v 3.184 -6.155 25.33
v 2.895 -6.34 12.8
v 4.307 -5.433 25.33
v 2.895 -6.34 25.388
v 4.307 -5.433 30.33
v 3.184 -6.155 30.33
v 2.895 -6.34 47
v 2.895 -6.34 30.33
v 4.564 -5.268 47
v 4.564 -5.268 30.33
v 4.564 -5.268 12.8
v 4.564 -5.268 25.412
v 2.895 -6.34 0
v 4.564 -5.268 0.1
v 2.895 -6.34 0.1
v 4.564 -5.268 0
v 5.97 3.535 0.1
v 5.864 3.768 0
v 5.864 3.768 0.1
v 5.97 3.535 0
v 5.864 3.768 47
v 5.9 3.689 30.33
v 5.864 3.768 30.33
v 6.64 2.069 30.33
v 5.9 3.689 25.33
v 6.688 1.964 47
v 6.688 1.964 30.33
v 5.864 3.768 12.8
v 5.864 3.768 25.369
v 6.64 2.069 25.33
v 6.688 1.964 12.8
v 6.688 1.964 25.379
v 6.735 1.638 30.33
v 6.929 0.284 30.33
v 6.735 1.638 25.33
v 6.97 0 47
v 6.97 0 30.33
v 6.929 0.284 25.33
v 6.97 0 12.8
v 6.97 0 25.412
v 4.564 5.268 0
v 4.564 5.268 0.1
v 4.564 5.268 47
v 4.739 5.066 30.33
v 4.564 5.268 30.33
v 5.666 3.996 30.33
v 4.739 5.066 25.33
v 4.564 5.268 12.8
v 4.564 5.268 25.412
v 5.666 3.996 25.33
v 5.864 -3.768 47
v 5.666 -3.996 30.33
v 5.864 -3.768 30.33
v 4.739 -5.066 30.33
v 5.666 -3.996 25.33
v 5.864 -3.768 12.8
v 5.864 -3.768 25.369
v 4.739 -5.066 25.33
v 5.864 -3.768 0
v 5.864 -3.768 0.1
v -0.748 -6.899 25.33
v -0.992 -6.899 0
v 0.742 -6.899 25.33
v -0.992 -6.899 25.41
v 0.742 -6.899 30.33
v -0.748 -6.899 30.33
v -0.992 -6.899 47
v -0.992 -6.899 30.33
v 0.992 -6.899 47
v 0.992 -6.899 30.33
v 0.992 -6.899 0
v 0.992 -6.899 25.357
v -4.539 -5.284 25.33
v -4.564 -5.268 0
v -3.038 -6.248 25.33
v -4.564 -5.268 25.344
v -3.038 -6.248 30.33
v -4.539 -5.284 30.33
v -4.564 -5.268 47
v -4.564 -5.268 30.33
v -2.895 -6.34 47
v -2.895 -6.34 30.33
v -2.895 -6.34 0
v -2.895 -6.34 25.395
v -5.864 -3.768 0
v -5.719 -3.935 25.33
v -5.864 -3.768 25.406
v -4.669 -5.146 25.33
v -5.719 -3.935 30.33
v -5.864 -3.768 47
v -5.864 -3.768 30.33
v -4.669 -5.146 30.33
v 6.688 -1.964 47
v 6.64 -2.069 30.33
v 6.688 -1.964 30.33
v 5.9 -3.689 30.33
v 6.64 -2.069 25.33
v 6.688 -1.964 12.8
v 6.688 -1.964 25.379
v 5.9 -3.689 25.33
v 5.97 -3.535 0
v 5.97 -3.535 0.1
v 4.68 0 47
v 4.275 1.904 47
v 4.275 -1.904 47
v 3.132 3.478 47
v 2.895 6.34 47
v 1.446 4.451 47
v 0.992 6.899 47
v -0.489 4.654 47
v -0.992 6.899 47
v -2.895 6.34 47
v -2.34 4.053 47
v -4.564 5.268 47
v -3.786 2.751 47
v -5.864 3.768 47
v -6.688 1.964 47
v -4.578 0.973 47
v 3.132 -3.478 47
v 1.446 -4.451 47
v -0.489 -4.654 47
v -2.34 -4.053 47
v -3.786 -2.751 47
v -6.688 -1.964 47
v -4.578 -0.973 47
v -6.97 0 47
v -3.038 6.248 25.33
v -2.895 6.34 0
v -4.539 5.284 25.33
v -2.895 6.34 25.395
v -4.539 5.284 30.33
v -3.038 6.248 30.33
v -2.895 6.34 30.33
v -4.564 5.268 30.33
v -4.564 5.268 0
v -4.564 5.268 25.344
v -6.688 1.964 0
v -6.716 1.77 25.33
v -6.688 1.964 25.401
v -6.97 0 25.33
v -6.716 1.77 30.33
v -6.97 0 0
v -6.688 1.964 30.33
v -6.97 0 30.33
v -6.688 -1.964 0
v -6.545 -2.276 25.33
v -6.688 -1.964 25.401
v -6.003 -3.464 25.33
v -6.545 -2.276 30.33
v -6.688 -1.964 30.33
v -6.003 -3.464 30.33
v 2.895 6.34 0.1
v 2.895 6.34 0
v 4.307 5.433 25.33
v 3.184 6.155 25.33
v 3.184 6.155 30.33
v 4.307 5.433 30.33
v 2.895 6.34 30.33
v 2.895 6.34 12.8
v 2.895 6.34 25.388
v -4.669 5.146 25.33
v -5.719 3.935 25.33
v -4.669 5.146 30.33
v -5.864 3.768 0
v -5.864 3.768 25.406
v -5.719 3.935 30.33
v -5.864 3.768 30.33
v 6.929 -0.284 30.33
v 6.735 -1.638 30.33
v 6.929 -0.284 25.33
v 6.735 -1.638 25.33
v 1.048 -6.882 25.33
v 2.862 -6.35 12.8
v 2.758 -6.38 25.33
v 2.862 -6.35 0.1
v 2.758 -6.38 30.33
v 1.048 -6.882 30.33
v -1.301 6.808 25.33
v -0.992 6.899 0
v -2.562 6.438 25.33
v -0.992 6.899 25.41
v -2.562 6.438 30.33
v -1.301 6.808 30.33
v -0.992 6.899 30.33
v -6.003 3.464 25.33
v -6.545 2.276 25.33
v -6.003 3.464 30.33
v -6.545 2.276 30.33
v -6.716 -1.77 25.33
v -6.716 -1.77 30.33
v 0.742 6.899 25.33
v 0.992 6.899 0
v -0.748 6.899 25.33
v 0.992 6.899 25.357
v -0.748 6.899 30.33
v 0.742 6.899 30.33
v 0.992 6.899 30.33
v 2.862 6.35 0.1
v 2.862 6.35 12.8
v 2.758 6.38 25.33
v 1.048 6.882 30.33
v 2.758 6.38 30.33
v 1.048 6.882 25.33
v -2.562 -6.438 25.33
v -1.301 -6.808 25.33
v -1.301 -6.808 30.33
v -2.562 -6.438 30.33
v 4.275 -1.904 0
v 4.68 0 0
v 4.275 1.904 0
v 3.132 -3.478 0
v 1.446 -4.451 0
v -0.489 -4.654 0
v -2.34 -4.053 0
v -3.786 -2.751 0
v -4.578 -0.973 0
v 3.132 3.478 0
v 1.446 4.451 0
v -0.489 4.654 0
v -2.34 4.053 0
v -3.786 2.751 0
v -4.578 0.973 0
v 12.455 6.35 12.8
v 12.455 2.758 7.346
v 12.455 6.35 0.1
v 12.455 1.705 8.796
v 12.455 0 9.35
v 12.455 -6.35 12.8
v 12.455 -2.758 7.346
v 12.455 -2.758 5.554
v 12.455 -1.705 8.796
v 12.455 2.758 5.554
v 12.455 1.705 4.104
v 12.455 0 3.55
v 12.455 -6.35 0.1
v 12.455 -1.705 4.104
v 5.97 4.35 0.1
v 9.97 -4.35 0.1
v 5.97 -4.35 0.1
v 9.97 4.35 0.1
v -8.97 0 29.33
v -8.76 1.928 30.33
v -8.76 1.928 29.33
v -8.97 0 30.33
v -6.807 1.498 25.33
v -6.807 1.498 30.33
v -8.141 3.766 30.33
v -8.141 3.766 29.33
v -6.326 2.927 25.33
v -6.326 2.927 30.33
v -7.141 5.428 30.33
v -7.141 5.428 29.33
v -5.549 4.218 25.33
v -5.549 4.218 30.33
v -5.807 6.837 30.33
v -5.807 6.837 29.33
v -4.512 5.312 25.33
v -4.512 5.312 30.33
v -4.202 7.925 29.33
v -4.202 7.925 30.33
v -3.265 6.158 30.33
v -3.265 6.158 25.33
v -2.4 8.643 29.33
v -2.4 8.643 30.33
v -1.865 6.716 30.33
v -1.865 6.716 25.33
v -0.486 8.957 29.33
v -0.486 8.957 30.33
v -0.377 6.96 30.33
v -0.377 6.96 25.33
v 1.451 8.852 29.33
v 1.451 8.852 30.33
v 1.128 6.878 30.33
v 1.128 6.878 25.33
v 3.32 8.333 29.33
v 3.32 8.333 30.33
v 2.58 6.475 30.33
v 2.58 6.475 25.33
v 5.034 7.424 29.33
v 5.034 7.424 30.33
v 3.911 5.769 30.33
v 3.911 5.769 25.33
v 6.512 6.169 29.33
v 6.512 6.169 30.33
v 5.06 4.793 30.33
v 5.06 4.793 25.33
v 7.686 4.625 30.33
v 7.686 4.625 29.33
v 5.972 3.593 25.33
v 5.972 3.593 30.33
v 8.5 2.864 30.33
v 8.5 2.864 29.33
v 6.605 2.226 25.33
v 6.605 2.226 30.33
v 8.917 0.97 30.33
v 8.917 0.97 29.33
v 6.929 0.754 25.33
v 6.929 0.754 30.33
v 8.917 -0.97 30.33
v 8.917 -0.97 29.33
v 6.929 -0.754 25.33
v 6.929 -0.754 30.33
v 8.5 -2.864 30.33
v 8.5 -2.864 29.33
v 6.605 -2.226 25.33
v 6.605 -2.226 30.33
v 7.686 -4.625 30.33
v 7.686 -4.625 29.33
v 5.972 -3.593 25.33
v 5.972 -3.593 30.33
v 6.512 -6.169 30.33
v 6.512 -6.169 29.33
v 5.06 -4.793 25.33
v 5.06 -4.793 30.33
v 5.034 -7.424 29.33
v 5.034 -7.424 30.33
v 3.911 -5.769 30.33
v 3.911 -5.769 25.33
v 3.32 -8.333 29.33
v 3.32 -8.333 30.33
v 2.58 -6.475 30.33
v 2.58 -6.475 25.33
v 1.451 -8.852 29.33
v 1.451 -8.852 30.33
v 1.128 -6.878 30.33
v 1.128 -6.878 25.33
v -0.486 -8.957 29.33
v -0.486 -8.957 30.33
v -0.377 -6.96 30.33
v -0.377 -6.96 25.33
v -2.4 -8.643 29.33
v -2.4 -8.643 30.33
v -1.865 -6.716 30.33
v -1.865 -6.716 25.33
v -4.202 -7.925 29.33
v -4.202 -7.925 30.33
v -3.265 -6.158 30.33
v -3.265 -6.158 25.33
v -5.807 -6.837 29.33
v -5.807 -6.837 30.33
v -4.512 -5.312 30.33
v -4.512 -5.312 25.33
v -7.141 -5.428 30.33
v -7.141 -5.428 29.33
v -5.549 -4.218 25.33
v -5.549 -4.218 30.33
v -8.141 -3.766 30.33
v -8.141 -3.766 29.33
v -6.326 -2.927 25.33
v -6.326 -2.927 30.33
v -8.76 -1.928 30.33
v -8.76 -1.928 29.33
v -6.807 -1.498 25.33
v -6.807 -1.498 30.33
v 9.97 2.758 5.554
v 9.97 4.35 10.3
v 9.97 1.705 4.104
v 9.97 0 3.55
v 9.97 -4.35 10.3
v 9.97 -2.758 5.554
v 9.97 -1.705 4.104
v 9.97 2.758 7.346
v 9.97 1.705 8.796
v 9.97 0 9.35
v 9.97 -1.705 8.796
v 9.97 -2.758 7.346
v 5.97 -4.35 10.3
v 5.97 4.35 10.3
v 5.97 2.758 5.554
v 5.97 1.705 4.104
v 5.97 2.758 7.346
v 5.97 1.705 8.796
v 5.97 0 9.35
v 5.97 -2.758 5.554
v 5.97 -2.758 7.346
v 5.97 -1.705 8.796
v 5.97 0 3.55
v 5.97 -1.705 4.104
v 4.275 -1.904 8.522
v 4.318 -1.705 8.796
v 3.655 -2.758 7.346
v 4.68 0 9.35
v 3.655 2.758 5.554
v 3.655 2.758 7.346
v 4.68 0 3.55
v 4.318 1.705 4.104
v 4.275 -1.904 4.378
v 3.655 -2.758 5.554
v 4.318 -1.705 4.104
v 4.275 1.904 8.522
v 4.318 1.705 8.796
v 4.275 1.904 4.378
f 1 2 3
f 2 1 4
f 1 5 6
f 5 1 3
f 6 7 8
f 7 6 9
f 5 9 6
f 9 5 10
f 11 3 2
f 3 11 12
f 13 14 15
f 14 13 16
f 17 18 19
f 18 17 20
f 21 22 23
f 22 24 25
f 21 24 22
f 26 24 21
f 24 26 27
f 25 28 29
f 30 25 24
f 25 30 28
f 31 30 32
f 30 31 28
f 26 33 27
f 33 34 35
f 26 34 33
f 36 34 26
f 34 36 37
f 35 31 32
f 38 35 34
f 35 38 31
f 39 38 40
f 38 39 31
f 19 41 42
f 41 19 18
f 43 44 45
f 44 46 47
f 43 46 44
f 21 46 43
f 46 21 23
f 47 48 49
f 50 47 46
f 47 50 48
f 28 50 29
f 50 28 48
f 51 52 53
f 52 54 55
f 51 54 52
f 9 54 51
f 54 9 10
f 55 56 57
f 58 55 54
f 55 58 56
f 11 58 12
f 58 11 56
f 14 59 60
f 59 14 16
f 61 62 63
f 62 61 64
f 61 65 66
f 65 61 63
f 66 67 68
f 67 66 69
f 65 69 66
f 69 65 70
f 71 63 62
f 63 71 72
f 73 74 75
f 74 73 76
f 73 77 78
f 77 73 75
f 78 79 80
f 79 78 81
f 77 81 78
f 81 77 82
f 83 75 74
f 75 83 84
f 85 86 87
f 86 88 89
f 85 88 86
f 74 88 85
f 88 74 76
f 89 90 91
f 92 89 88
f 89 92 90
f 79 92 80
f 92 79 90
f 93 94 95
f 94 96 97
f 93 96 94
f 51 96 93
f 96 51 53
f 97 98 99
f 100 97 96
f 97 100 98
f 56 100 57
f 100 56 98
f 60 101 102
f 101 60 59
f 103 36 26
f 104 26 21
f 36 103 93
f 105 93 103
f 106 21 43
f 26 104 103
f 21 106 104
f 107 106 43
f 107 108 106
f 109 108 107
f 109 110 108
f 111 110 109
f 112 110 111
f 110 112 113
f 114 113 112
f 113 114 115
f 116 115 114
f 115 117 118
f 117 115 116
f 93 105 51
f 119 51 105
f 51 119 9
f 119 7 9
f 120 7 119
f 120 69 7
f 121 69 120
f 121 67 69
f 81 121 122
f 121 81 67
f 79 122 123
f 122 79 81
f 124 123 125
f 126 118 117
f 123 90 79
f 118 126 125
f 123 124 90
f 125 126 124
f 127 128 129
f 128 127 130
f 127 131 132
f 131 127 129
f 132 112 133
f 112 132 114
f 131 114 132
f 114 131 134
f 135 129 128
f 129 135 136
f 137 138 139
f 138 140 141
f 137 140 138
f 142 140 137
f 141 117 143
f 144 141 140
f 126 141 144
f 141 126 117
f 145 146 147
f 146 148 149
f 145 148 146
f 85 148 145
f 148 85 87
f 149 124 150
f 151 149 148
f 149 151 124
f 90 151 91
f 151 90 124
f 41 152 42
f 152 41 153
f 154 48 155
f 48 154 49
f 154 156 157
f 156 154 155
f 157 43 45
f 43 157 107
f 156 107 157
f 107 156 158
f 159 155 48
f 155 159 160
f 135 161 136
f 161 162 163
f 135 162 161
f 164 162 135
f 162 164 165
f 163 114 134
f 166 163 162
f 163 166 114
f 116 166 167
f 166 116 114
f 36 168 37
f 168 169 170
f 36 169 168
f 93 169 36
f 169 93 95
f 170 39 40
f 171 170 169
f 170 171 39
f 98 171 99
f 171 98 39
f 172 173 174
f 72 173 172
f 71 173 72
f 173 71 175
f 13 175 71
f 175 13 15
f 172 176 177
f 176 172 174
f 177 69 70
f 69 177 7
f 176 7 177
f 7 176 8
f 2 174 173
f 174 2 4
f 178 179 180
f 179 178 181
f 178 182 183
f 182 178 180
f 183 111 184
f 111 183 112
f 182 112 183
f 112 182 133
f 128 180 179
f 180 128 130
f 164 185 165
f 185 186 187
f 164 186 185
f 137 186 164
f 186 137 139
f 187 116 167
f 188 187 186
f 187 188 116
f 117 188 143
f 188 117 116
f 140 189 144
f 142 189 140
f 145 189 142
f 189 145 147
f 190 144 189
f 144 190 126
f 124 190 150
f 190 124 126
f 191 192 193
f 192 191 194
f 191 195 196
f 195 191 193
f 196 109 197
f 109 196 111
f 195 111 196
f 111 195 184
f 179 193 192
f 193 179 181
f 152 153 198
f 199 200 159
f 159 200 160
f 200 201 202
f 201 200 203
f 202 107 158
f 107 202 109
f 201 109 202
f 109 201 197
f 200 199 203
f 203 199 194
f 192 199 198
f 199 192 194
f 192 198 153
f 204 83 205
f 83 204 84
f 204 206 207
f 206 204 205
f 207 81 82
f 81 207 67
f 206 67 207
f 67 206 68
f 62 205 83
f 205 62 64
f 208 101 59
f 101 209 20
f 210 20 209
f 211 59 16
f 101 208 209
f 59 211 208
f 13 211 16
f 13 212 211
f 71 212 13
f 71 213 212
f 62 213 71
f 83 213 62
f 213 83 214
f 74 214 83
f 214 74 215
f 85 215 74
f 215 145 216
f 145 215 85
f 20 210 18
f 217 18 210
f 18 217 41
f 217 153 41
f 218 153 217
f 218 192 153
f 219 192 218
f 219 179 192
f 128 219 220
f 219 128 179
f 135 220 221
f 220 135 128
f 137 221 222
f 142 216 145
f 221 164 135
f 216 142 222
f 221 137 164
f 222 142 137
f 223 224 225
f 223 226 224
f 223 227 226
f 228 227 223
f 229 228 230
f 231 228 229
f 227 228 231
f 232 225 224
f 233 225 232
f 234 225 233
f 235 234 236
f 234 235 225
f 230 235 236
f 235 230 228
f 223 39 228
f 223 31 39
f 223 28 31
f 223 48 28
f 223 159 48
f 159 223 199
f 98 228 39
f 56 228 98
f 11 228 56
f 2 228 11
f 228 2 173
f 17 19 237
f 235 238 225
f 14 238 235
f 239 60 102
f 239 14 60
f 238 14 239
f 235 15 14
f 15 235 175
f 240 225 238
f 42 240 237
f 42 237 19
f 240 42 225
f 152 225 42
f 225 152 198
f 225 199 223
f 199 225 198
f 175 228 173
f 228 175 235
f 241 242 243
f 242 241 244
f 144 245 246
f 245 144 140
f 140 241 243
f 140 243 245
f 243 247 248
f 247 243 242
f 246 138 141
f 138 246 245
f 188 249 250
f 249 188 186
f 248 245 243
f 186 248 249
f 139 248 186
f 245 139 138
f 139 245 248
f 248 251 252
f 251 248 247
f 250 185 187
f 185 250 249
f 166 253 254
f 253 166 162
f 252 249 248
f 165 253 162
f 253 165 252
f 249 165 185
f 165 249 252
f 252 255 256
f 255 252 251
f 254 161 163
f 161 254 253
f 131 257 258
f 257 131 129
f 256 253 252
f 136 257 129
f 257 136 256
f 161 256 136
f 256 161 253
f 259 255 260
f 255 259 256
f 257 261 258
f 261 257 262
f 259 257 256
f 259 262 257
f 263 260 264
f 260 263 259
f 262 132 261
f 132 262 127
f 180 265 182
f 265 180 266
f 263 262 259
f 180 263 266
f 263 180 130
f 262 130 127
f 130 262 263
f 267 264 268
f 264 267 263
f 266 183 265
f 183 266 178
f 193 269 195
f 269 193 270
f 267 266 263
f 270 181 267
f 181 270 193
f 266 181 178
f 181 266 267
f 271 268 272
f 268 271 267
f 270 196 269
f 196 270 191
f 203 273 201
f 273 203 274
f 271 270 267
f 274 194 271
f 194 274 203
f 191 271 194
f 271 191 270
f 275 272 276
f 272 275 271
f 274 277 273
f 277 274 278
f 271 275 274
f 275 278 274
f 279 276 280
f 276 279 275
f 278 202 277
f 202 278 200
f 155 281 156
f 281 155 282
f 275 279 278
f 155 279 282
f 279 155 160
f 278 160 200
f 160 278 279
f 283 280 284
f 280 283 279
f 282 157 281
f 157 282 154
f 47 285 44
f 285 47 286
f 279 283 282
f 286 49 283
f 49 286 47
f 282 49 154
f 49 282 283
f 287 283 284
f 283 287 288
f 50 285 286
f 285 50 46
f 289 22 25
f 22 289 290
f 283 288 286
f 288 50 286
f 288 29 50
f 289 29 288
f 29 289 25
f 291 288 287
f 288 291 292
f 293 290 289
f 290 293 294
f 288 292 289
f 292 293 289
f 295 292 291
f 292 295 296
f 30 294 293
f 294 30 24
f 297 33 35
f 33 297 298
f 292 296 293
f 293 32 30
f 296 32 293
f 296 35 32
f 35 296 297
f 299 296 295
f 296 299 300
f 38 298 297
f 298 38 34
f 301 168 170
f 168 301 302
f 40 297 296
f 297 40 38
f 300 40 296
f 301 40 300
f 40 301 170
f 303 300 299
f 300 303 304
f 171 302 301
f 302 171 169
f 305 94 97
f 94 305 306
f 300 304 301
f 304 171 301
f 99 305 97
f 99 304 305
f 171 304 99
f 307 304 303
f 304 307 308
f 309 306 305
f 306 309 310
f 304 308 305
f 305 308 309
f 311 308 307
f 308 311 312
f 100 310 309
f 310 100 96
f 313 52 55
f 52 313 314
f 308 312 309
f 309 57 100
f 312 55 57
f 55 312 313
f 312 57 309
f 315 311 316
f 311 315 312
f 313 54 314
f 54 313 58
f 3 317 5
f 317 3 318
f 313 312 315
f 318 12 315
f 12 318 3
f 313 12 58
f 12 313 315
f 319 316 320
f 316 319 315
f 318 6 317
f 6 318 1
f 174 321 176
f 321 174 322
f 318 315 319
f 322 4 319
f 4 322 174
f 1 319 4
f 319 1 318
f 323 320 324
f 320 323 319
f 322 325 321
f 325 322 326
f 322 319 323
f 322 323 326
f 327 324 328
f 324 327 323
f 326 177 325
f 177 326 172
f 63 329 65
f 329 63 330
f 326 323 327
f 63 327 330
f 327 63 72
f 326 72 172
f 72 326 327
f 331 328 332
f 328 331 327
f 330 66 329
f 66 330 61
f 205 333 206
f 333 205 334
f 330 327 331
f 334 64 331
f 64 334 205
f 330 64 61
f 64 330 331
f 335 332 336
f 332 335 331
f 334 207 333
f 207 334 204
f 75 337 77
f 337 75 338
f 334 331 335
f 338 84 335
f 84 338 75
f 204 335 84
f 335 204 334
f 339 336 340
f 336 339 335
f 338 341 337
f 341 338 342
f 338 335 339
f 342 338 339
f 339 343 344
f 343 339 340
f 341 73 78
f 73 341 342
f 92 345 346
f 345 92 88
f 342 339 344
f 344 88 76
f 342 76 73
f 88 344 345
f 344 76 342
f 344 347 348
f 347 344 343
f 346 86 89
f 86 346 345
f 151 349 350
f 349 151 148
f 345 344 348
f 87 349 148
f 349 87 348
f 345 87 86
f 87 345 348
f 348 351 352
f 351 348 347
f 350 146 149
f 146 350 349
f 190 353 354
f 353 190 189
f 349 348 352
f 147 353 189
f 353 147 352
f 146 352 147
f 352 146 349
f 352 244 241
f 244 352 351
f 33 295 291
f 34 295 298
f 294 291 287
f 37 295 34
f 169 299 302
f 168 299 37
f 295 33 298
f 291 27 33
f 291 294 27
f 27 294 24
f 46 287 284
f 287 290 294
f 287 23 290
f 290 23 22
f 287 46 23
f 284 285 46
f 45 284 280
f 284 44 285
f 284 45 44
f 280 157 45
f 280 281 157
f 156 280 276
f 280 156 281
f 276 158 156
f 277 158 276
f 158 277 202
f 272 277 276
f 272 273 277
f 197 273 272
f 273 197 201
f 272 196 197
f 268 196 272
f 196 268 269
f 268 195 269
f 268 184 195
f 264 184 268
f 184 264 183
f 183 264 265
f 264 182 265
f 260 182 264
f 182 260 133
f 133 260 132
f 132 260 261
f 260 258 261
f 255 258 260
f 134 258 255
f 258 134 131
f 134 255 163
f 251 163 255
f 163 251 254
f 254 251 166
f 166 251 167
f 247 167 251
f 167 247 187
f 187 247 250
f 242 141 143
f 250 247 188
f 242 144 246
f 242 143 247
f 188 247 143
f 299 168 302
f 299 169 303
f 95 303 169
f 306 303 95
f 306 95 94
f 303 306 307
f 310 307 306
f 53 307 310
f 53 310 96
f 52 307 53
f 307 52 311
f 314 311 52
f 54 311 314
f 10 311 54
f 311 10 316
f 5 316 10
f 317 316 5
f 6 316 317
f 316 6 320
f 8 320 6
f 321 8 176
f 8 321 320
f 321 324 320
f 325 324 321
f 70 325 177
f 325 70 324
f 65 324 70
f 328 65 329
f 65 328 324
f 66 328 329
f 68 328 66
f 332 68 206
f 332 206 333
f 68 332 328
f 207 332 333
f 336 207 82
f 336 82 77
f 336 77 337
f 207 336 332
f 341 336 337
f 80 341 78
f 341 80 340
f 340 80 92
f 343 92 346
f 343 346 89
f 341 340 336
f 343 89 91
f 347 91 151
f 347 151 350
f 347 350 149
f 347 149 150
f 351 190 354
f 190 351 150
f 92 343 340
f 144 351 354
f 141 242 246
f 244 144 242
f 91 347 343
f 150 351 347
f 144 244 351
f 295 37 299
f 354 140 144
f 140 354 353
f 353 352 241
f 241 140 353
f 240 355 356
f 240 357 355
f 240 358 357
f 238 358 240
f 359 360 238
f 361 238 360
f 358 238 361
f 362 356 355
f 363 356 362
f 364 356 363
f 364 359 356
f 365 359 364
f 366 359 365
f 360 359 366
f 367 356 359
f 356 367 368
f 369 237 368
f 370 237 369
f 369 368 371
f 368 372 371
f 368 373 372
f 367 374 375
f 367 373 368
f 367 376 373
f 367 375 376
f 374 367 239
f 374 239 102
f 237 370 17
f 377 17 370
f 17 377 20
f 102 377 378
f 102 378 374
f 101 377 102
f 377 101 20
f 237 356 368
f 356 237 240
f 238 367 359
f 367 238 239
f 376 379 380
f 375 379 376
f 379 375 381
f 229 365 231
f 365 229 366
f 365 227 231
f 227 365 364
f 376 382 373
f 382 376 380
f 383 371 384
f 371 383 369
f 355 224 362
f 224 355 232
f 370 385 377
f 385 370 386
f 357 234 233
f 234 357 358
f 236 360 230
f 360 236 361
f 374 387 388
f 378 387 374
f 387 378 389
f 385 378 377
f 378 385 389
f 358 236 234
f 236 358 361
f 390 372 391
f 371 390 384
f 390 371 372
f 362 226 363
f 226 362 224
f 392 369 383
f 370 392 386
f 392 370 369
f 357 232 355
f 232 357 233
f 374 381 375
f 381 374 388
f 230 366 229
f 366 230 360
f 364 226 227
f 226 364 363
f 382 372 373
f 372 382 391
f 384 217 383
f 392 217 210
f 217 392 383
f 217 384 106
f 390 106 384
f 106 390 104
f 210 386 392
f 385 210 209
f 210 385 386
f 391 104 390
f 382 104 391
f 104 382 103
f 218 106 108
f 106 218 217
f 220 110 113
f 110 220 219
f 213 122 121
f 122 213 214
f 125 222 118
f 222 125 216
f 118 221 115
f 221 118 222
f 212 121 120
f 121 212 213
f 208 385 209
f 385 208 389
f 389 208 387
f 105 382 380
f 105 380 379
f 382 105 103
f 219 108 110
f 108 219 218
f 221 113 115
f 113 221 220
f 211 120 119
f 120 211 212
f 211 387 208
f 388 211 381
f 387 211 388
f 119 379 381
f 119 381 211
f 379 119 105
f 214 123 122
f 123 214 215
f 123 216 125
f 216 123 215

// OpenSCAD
// Silhouette plotter/cutter pen holder
// 
// Chad Frost
// https://github.com/chadfrost/silhouette-pen-adapter
// Based on http://www.thingiverse.com/thing:303835

pen_barrel_diam = 9.36;
pen_tip_diam = 3.00;
pen_tip_length = 5.00;

adapter_od = 13.84+0.1;
adapter_height = 47.0;

flange_height = 27.10+3.23; // from face of flange, to tip
flange_edge_thickness = 1.0;
flange_od = adapter_od+4.0;

tip_od = 9.83;
tip_length = 3.23;

// captive nut dims (as measured)
nut_thickness = 3.80;
nut_width = 8.50;
nut_clearance = 0.2;

// setscrew dims (as measured)
screw_head_diam = 6.40;
screw_head_height = 4.00;
screw_thread_diam = 5.60;
screw_clearance = 0.2;

nut_holder_wall = 2.0;
nut_holder_offset = 1.0; // x-offset from barrel, to accommodate larger pen od

// setscrew location (from base end of adapter)
screw_position = nut_width / 2 + nut_clearance + nut_holder_wall;


difference(){
// build up solid:
    union(){
        // adapter barrel
        cylinder(d=adapter_od, h=adapter_height);

        // nut holder
        translate([adapter_od/2,0,screw_position]){
            cube([nut_thickness+nut_clearance+adapter_od/2, nut_width+nut_clearance+nut_holder_wall*2, nut_width+nut_clearance+nut_holder_wall*2], center=true);
            //+nut_holder_wall+nut_holder_offset
        }
        
        // flange
         translate([0,0,flange_height]){
            rotate_extrude(angle = 360, convexity = 2) {
                // flange
                //translate([adapter_od/2, 0, 0]){
                    polygon( points=[[adapter_od/2,0],[flange_od/2,0],[flange_od/2,-flange_edge_thickness],[adapter_od/2,-(flange_od-adapter_od+flange_edge_thickness)]]);
                //}
            }
        }
    }

// remove material:
    // adapter interior, to (approx) match pen
    translate([0,0,-1]) cylinder(d=pen_barrel_diam, h=adapter_height+2);

    // nut holder interior
    translate([adapter_od/2+nut_holder_offset,0,screw_position]){
        #translate([0,0,-nut_holder_wall]) 
            cube([nut_thickness+nut_clearance, nut_width+nut_clearance, nut_width+nut_clearance+nut_holder_wall+1], center=true);
        
        #rotate([0,90,0]) 
            cylinder(d=screw_thread_diam+screw_clearance, h=nut_thickness+nut_holder_wall*2+nut_clearance+5, center=true);
    }
}
